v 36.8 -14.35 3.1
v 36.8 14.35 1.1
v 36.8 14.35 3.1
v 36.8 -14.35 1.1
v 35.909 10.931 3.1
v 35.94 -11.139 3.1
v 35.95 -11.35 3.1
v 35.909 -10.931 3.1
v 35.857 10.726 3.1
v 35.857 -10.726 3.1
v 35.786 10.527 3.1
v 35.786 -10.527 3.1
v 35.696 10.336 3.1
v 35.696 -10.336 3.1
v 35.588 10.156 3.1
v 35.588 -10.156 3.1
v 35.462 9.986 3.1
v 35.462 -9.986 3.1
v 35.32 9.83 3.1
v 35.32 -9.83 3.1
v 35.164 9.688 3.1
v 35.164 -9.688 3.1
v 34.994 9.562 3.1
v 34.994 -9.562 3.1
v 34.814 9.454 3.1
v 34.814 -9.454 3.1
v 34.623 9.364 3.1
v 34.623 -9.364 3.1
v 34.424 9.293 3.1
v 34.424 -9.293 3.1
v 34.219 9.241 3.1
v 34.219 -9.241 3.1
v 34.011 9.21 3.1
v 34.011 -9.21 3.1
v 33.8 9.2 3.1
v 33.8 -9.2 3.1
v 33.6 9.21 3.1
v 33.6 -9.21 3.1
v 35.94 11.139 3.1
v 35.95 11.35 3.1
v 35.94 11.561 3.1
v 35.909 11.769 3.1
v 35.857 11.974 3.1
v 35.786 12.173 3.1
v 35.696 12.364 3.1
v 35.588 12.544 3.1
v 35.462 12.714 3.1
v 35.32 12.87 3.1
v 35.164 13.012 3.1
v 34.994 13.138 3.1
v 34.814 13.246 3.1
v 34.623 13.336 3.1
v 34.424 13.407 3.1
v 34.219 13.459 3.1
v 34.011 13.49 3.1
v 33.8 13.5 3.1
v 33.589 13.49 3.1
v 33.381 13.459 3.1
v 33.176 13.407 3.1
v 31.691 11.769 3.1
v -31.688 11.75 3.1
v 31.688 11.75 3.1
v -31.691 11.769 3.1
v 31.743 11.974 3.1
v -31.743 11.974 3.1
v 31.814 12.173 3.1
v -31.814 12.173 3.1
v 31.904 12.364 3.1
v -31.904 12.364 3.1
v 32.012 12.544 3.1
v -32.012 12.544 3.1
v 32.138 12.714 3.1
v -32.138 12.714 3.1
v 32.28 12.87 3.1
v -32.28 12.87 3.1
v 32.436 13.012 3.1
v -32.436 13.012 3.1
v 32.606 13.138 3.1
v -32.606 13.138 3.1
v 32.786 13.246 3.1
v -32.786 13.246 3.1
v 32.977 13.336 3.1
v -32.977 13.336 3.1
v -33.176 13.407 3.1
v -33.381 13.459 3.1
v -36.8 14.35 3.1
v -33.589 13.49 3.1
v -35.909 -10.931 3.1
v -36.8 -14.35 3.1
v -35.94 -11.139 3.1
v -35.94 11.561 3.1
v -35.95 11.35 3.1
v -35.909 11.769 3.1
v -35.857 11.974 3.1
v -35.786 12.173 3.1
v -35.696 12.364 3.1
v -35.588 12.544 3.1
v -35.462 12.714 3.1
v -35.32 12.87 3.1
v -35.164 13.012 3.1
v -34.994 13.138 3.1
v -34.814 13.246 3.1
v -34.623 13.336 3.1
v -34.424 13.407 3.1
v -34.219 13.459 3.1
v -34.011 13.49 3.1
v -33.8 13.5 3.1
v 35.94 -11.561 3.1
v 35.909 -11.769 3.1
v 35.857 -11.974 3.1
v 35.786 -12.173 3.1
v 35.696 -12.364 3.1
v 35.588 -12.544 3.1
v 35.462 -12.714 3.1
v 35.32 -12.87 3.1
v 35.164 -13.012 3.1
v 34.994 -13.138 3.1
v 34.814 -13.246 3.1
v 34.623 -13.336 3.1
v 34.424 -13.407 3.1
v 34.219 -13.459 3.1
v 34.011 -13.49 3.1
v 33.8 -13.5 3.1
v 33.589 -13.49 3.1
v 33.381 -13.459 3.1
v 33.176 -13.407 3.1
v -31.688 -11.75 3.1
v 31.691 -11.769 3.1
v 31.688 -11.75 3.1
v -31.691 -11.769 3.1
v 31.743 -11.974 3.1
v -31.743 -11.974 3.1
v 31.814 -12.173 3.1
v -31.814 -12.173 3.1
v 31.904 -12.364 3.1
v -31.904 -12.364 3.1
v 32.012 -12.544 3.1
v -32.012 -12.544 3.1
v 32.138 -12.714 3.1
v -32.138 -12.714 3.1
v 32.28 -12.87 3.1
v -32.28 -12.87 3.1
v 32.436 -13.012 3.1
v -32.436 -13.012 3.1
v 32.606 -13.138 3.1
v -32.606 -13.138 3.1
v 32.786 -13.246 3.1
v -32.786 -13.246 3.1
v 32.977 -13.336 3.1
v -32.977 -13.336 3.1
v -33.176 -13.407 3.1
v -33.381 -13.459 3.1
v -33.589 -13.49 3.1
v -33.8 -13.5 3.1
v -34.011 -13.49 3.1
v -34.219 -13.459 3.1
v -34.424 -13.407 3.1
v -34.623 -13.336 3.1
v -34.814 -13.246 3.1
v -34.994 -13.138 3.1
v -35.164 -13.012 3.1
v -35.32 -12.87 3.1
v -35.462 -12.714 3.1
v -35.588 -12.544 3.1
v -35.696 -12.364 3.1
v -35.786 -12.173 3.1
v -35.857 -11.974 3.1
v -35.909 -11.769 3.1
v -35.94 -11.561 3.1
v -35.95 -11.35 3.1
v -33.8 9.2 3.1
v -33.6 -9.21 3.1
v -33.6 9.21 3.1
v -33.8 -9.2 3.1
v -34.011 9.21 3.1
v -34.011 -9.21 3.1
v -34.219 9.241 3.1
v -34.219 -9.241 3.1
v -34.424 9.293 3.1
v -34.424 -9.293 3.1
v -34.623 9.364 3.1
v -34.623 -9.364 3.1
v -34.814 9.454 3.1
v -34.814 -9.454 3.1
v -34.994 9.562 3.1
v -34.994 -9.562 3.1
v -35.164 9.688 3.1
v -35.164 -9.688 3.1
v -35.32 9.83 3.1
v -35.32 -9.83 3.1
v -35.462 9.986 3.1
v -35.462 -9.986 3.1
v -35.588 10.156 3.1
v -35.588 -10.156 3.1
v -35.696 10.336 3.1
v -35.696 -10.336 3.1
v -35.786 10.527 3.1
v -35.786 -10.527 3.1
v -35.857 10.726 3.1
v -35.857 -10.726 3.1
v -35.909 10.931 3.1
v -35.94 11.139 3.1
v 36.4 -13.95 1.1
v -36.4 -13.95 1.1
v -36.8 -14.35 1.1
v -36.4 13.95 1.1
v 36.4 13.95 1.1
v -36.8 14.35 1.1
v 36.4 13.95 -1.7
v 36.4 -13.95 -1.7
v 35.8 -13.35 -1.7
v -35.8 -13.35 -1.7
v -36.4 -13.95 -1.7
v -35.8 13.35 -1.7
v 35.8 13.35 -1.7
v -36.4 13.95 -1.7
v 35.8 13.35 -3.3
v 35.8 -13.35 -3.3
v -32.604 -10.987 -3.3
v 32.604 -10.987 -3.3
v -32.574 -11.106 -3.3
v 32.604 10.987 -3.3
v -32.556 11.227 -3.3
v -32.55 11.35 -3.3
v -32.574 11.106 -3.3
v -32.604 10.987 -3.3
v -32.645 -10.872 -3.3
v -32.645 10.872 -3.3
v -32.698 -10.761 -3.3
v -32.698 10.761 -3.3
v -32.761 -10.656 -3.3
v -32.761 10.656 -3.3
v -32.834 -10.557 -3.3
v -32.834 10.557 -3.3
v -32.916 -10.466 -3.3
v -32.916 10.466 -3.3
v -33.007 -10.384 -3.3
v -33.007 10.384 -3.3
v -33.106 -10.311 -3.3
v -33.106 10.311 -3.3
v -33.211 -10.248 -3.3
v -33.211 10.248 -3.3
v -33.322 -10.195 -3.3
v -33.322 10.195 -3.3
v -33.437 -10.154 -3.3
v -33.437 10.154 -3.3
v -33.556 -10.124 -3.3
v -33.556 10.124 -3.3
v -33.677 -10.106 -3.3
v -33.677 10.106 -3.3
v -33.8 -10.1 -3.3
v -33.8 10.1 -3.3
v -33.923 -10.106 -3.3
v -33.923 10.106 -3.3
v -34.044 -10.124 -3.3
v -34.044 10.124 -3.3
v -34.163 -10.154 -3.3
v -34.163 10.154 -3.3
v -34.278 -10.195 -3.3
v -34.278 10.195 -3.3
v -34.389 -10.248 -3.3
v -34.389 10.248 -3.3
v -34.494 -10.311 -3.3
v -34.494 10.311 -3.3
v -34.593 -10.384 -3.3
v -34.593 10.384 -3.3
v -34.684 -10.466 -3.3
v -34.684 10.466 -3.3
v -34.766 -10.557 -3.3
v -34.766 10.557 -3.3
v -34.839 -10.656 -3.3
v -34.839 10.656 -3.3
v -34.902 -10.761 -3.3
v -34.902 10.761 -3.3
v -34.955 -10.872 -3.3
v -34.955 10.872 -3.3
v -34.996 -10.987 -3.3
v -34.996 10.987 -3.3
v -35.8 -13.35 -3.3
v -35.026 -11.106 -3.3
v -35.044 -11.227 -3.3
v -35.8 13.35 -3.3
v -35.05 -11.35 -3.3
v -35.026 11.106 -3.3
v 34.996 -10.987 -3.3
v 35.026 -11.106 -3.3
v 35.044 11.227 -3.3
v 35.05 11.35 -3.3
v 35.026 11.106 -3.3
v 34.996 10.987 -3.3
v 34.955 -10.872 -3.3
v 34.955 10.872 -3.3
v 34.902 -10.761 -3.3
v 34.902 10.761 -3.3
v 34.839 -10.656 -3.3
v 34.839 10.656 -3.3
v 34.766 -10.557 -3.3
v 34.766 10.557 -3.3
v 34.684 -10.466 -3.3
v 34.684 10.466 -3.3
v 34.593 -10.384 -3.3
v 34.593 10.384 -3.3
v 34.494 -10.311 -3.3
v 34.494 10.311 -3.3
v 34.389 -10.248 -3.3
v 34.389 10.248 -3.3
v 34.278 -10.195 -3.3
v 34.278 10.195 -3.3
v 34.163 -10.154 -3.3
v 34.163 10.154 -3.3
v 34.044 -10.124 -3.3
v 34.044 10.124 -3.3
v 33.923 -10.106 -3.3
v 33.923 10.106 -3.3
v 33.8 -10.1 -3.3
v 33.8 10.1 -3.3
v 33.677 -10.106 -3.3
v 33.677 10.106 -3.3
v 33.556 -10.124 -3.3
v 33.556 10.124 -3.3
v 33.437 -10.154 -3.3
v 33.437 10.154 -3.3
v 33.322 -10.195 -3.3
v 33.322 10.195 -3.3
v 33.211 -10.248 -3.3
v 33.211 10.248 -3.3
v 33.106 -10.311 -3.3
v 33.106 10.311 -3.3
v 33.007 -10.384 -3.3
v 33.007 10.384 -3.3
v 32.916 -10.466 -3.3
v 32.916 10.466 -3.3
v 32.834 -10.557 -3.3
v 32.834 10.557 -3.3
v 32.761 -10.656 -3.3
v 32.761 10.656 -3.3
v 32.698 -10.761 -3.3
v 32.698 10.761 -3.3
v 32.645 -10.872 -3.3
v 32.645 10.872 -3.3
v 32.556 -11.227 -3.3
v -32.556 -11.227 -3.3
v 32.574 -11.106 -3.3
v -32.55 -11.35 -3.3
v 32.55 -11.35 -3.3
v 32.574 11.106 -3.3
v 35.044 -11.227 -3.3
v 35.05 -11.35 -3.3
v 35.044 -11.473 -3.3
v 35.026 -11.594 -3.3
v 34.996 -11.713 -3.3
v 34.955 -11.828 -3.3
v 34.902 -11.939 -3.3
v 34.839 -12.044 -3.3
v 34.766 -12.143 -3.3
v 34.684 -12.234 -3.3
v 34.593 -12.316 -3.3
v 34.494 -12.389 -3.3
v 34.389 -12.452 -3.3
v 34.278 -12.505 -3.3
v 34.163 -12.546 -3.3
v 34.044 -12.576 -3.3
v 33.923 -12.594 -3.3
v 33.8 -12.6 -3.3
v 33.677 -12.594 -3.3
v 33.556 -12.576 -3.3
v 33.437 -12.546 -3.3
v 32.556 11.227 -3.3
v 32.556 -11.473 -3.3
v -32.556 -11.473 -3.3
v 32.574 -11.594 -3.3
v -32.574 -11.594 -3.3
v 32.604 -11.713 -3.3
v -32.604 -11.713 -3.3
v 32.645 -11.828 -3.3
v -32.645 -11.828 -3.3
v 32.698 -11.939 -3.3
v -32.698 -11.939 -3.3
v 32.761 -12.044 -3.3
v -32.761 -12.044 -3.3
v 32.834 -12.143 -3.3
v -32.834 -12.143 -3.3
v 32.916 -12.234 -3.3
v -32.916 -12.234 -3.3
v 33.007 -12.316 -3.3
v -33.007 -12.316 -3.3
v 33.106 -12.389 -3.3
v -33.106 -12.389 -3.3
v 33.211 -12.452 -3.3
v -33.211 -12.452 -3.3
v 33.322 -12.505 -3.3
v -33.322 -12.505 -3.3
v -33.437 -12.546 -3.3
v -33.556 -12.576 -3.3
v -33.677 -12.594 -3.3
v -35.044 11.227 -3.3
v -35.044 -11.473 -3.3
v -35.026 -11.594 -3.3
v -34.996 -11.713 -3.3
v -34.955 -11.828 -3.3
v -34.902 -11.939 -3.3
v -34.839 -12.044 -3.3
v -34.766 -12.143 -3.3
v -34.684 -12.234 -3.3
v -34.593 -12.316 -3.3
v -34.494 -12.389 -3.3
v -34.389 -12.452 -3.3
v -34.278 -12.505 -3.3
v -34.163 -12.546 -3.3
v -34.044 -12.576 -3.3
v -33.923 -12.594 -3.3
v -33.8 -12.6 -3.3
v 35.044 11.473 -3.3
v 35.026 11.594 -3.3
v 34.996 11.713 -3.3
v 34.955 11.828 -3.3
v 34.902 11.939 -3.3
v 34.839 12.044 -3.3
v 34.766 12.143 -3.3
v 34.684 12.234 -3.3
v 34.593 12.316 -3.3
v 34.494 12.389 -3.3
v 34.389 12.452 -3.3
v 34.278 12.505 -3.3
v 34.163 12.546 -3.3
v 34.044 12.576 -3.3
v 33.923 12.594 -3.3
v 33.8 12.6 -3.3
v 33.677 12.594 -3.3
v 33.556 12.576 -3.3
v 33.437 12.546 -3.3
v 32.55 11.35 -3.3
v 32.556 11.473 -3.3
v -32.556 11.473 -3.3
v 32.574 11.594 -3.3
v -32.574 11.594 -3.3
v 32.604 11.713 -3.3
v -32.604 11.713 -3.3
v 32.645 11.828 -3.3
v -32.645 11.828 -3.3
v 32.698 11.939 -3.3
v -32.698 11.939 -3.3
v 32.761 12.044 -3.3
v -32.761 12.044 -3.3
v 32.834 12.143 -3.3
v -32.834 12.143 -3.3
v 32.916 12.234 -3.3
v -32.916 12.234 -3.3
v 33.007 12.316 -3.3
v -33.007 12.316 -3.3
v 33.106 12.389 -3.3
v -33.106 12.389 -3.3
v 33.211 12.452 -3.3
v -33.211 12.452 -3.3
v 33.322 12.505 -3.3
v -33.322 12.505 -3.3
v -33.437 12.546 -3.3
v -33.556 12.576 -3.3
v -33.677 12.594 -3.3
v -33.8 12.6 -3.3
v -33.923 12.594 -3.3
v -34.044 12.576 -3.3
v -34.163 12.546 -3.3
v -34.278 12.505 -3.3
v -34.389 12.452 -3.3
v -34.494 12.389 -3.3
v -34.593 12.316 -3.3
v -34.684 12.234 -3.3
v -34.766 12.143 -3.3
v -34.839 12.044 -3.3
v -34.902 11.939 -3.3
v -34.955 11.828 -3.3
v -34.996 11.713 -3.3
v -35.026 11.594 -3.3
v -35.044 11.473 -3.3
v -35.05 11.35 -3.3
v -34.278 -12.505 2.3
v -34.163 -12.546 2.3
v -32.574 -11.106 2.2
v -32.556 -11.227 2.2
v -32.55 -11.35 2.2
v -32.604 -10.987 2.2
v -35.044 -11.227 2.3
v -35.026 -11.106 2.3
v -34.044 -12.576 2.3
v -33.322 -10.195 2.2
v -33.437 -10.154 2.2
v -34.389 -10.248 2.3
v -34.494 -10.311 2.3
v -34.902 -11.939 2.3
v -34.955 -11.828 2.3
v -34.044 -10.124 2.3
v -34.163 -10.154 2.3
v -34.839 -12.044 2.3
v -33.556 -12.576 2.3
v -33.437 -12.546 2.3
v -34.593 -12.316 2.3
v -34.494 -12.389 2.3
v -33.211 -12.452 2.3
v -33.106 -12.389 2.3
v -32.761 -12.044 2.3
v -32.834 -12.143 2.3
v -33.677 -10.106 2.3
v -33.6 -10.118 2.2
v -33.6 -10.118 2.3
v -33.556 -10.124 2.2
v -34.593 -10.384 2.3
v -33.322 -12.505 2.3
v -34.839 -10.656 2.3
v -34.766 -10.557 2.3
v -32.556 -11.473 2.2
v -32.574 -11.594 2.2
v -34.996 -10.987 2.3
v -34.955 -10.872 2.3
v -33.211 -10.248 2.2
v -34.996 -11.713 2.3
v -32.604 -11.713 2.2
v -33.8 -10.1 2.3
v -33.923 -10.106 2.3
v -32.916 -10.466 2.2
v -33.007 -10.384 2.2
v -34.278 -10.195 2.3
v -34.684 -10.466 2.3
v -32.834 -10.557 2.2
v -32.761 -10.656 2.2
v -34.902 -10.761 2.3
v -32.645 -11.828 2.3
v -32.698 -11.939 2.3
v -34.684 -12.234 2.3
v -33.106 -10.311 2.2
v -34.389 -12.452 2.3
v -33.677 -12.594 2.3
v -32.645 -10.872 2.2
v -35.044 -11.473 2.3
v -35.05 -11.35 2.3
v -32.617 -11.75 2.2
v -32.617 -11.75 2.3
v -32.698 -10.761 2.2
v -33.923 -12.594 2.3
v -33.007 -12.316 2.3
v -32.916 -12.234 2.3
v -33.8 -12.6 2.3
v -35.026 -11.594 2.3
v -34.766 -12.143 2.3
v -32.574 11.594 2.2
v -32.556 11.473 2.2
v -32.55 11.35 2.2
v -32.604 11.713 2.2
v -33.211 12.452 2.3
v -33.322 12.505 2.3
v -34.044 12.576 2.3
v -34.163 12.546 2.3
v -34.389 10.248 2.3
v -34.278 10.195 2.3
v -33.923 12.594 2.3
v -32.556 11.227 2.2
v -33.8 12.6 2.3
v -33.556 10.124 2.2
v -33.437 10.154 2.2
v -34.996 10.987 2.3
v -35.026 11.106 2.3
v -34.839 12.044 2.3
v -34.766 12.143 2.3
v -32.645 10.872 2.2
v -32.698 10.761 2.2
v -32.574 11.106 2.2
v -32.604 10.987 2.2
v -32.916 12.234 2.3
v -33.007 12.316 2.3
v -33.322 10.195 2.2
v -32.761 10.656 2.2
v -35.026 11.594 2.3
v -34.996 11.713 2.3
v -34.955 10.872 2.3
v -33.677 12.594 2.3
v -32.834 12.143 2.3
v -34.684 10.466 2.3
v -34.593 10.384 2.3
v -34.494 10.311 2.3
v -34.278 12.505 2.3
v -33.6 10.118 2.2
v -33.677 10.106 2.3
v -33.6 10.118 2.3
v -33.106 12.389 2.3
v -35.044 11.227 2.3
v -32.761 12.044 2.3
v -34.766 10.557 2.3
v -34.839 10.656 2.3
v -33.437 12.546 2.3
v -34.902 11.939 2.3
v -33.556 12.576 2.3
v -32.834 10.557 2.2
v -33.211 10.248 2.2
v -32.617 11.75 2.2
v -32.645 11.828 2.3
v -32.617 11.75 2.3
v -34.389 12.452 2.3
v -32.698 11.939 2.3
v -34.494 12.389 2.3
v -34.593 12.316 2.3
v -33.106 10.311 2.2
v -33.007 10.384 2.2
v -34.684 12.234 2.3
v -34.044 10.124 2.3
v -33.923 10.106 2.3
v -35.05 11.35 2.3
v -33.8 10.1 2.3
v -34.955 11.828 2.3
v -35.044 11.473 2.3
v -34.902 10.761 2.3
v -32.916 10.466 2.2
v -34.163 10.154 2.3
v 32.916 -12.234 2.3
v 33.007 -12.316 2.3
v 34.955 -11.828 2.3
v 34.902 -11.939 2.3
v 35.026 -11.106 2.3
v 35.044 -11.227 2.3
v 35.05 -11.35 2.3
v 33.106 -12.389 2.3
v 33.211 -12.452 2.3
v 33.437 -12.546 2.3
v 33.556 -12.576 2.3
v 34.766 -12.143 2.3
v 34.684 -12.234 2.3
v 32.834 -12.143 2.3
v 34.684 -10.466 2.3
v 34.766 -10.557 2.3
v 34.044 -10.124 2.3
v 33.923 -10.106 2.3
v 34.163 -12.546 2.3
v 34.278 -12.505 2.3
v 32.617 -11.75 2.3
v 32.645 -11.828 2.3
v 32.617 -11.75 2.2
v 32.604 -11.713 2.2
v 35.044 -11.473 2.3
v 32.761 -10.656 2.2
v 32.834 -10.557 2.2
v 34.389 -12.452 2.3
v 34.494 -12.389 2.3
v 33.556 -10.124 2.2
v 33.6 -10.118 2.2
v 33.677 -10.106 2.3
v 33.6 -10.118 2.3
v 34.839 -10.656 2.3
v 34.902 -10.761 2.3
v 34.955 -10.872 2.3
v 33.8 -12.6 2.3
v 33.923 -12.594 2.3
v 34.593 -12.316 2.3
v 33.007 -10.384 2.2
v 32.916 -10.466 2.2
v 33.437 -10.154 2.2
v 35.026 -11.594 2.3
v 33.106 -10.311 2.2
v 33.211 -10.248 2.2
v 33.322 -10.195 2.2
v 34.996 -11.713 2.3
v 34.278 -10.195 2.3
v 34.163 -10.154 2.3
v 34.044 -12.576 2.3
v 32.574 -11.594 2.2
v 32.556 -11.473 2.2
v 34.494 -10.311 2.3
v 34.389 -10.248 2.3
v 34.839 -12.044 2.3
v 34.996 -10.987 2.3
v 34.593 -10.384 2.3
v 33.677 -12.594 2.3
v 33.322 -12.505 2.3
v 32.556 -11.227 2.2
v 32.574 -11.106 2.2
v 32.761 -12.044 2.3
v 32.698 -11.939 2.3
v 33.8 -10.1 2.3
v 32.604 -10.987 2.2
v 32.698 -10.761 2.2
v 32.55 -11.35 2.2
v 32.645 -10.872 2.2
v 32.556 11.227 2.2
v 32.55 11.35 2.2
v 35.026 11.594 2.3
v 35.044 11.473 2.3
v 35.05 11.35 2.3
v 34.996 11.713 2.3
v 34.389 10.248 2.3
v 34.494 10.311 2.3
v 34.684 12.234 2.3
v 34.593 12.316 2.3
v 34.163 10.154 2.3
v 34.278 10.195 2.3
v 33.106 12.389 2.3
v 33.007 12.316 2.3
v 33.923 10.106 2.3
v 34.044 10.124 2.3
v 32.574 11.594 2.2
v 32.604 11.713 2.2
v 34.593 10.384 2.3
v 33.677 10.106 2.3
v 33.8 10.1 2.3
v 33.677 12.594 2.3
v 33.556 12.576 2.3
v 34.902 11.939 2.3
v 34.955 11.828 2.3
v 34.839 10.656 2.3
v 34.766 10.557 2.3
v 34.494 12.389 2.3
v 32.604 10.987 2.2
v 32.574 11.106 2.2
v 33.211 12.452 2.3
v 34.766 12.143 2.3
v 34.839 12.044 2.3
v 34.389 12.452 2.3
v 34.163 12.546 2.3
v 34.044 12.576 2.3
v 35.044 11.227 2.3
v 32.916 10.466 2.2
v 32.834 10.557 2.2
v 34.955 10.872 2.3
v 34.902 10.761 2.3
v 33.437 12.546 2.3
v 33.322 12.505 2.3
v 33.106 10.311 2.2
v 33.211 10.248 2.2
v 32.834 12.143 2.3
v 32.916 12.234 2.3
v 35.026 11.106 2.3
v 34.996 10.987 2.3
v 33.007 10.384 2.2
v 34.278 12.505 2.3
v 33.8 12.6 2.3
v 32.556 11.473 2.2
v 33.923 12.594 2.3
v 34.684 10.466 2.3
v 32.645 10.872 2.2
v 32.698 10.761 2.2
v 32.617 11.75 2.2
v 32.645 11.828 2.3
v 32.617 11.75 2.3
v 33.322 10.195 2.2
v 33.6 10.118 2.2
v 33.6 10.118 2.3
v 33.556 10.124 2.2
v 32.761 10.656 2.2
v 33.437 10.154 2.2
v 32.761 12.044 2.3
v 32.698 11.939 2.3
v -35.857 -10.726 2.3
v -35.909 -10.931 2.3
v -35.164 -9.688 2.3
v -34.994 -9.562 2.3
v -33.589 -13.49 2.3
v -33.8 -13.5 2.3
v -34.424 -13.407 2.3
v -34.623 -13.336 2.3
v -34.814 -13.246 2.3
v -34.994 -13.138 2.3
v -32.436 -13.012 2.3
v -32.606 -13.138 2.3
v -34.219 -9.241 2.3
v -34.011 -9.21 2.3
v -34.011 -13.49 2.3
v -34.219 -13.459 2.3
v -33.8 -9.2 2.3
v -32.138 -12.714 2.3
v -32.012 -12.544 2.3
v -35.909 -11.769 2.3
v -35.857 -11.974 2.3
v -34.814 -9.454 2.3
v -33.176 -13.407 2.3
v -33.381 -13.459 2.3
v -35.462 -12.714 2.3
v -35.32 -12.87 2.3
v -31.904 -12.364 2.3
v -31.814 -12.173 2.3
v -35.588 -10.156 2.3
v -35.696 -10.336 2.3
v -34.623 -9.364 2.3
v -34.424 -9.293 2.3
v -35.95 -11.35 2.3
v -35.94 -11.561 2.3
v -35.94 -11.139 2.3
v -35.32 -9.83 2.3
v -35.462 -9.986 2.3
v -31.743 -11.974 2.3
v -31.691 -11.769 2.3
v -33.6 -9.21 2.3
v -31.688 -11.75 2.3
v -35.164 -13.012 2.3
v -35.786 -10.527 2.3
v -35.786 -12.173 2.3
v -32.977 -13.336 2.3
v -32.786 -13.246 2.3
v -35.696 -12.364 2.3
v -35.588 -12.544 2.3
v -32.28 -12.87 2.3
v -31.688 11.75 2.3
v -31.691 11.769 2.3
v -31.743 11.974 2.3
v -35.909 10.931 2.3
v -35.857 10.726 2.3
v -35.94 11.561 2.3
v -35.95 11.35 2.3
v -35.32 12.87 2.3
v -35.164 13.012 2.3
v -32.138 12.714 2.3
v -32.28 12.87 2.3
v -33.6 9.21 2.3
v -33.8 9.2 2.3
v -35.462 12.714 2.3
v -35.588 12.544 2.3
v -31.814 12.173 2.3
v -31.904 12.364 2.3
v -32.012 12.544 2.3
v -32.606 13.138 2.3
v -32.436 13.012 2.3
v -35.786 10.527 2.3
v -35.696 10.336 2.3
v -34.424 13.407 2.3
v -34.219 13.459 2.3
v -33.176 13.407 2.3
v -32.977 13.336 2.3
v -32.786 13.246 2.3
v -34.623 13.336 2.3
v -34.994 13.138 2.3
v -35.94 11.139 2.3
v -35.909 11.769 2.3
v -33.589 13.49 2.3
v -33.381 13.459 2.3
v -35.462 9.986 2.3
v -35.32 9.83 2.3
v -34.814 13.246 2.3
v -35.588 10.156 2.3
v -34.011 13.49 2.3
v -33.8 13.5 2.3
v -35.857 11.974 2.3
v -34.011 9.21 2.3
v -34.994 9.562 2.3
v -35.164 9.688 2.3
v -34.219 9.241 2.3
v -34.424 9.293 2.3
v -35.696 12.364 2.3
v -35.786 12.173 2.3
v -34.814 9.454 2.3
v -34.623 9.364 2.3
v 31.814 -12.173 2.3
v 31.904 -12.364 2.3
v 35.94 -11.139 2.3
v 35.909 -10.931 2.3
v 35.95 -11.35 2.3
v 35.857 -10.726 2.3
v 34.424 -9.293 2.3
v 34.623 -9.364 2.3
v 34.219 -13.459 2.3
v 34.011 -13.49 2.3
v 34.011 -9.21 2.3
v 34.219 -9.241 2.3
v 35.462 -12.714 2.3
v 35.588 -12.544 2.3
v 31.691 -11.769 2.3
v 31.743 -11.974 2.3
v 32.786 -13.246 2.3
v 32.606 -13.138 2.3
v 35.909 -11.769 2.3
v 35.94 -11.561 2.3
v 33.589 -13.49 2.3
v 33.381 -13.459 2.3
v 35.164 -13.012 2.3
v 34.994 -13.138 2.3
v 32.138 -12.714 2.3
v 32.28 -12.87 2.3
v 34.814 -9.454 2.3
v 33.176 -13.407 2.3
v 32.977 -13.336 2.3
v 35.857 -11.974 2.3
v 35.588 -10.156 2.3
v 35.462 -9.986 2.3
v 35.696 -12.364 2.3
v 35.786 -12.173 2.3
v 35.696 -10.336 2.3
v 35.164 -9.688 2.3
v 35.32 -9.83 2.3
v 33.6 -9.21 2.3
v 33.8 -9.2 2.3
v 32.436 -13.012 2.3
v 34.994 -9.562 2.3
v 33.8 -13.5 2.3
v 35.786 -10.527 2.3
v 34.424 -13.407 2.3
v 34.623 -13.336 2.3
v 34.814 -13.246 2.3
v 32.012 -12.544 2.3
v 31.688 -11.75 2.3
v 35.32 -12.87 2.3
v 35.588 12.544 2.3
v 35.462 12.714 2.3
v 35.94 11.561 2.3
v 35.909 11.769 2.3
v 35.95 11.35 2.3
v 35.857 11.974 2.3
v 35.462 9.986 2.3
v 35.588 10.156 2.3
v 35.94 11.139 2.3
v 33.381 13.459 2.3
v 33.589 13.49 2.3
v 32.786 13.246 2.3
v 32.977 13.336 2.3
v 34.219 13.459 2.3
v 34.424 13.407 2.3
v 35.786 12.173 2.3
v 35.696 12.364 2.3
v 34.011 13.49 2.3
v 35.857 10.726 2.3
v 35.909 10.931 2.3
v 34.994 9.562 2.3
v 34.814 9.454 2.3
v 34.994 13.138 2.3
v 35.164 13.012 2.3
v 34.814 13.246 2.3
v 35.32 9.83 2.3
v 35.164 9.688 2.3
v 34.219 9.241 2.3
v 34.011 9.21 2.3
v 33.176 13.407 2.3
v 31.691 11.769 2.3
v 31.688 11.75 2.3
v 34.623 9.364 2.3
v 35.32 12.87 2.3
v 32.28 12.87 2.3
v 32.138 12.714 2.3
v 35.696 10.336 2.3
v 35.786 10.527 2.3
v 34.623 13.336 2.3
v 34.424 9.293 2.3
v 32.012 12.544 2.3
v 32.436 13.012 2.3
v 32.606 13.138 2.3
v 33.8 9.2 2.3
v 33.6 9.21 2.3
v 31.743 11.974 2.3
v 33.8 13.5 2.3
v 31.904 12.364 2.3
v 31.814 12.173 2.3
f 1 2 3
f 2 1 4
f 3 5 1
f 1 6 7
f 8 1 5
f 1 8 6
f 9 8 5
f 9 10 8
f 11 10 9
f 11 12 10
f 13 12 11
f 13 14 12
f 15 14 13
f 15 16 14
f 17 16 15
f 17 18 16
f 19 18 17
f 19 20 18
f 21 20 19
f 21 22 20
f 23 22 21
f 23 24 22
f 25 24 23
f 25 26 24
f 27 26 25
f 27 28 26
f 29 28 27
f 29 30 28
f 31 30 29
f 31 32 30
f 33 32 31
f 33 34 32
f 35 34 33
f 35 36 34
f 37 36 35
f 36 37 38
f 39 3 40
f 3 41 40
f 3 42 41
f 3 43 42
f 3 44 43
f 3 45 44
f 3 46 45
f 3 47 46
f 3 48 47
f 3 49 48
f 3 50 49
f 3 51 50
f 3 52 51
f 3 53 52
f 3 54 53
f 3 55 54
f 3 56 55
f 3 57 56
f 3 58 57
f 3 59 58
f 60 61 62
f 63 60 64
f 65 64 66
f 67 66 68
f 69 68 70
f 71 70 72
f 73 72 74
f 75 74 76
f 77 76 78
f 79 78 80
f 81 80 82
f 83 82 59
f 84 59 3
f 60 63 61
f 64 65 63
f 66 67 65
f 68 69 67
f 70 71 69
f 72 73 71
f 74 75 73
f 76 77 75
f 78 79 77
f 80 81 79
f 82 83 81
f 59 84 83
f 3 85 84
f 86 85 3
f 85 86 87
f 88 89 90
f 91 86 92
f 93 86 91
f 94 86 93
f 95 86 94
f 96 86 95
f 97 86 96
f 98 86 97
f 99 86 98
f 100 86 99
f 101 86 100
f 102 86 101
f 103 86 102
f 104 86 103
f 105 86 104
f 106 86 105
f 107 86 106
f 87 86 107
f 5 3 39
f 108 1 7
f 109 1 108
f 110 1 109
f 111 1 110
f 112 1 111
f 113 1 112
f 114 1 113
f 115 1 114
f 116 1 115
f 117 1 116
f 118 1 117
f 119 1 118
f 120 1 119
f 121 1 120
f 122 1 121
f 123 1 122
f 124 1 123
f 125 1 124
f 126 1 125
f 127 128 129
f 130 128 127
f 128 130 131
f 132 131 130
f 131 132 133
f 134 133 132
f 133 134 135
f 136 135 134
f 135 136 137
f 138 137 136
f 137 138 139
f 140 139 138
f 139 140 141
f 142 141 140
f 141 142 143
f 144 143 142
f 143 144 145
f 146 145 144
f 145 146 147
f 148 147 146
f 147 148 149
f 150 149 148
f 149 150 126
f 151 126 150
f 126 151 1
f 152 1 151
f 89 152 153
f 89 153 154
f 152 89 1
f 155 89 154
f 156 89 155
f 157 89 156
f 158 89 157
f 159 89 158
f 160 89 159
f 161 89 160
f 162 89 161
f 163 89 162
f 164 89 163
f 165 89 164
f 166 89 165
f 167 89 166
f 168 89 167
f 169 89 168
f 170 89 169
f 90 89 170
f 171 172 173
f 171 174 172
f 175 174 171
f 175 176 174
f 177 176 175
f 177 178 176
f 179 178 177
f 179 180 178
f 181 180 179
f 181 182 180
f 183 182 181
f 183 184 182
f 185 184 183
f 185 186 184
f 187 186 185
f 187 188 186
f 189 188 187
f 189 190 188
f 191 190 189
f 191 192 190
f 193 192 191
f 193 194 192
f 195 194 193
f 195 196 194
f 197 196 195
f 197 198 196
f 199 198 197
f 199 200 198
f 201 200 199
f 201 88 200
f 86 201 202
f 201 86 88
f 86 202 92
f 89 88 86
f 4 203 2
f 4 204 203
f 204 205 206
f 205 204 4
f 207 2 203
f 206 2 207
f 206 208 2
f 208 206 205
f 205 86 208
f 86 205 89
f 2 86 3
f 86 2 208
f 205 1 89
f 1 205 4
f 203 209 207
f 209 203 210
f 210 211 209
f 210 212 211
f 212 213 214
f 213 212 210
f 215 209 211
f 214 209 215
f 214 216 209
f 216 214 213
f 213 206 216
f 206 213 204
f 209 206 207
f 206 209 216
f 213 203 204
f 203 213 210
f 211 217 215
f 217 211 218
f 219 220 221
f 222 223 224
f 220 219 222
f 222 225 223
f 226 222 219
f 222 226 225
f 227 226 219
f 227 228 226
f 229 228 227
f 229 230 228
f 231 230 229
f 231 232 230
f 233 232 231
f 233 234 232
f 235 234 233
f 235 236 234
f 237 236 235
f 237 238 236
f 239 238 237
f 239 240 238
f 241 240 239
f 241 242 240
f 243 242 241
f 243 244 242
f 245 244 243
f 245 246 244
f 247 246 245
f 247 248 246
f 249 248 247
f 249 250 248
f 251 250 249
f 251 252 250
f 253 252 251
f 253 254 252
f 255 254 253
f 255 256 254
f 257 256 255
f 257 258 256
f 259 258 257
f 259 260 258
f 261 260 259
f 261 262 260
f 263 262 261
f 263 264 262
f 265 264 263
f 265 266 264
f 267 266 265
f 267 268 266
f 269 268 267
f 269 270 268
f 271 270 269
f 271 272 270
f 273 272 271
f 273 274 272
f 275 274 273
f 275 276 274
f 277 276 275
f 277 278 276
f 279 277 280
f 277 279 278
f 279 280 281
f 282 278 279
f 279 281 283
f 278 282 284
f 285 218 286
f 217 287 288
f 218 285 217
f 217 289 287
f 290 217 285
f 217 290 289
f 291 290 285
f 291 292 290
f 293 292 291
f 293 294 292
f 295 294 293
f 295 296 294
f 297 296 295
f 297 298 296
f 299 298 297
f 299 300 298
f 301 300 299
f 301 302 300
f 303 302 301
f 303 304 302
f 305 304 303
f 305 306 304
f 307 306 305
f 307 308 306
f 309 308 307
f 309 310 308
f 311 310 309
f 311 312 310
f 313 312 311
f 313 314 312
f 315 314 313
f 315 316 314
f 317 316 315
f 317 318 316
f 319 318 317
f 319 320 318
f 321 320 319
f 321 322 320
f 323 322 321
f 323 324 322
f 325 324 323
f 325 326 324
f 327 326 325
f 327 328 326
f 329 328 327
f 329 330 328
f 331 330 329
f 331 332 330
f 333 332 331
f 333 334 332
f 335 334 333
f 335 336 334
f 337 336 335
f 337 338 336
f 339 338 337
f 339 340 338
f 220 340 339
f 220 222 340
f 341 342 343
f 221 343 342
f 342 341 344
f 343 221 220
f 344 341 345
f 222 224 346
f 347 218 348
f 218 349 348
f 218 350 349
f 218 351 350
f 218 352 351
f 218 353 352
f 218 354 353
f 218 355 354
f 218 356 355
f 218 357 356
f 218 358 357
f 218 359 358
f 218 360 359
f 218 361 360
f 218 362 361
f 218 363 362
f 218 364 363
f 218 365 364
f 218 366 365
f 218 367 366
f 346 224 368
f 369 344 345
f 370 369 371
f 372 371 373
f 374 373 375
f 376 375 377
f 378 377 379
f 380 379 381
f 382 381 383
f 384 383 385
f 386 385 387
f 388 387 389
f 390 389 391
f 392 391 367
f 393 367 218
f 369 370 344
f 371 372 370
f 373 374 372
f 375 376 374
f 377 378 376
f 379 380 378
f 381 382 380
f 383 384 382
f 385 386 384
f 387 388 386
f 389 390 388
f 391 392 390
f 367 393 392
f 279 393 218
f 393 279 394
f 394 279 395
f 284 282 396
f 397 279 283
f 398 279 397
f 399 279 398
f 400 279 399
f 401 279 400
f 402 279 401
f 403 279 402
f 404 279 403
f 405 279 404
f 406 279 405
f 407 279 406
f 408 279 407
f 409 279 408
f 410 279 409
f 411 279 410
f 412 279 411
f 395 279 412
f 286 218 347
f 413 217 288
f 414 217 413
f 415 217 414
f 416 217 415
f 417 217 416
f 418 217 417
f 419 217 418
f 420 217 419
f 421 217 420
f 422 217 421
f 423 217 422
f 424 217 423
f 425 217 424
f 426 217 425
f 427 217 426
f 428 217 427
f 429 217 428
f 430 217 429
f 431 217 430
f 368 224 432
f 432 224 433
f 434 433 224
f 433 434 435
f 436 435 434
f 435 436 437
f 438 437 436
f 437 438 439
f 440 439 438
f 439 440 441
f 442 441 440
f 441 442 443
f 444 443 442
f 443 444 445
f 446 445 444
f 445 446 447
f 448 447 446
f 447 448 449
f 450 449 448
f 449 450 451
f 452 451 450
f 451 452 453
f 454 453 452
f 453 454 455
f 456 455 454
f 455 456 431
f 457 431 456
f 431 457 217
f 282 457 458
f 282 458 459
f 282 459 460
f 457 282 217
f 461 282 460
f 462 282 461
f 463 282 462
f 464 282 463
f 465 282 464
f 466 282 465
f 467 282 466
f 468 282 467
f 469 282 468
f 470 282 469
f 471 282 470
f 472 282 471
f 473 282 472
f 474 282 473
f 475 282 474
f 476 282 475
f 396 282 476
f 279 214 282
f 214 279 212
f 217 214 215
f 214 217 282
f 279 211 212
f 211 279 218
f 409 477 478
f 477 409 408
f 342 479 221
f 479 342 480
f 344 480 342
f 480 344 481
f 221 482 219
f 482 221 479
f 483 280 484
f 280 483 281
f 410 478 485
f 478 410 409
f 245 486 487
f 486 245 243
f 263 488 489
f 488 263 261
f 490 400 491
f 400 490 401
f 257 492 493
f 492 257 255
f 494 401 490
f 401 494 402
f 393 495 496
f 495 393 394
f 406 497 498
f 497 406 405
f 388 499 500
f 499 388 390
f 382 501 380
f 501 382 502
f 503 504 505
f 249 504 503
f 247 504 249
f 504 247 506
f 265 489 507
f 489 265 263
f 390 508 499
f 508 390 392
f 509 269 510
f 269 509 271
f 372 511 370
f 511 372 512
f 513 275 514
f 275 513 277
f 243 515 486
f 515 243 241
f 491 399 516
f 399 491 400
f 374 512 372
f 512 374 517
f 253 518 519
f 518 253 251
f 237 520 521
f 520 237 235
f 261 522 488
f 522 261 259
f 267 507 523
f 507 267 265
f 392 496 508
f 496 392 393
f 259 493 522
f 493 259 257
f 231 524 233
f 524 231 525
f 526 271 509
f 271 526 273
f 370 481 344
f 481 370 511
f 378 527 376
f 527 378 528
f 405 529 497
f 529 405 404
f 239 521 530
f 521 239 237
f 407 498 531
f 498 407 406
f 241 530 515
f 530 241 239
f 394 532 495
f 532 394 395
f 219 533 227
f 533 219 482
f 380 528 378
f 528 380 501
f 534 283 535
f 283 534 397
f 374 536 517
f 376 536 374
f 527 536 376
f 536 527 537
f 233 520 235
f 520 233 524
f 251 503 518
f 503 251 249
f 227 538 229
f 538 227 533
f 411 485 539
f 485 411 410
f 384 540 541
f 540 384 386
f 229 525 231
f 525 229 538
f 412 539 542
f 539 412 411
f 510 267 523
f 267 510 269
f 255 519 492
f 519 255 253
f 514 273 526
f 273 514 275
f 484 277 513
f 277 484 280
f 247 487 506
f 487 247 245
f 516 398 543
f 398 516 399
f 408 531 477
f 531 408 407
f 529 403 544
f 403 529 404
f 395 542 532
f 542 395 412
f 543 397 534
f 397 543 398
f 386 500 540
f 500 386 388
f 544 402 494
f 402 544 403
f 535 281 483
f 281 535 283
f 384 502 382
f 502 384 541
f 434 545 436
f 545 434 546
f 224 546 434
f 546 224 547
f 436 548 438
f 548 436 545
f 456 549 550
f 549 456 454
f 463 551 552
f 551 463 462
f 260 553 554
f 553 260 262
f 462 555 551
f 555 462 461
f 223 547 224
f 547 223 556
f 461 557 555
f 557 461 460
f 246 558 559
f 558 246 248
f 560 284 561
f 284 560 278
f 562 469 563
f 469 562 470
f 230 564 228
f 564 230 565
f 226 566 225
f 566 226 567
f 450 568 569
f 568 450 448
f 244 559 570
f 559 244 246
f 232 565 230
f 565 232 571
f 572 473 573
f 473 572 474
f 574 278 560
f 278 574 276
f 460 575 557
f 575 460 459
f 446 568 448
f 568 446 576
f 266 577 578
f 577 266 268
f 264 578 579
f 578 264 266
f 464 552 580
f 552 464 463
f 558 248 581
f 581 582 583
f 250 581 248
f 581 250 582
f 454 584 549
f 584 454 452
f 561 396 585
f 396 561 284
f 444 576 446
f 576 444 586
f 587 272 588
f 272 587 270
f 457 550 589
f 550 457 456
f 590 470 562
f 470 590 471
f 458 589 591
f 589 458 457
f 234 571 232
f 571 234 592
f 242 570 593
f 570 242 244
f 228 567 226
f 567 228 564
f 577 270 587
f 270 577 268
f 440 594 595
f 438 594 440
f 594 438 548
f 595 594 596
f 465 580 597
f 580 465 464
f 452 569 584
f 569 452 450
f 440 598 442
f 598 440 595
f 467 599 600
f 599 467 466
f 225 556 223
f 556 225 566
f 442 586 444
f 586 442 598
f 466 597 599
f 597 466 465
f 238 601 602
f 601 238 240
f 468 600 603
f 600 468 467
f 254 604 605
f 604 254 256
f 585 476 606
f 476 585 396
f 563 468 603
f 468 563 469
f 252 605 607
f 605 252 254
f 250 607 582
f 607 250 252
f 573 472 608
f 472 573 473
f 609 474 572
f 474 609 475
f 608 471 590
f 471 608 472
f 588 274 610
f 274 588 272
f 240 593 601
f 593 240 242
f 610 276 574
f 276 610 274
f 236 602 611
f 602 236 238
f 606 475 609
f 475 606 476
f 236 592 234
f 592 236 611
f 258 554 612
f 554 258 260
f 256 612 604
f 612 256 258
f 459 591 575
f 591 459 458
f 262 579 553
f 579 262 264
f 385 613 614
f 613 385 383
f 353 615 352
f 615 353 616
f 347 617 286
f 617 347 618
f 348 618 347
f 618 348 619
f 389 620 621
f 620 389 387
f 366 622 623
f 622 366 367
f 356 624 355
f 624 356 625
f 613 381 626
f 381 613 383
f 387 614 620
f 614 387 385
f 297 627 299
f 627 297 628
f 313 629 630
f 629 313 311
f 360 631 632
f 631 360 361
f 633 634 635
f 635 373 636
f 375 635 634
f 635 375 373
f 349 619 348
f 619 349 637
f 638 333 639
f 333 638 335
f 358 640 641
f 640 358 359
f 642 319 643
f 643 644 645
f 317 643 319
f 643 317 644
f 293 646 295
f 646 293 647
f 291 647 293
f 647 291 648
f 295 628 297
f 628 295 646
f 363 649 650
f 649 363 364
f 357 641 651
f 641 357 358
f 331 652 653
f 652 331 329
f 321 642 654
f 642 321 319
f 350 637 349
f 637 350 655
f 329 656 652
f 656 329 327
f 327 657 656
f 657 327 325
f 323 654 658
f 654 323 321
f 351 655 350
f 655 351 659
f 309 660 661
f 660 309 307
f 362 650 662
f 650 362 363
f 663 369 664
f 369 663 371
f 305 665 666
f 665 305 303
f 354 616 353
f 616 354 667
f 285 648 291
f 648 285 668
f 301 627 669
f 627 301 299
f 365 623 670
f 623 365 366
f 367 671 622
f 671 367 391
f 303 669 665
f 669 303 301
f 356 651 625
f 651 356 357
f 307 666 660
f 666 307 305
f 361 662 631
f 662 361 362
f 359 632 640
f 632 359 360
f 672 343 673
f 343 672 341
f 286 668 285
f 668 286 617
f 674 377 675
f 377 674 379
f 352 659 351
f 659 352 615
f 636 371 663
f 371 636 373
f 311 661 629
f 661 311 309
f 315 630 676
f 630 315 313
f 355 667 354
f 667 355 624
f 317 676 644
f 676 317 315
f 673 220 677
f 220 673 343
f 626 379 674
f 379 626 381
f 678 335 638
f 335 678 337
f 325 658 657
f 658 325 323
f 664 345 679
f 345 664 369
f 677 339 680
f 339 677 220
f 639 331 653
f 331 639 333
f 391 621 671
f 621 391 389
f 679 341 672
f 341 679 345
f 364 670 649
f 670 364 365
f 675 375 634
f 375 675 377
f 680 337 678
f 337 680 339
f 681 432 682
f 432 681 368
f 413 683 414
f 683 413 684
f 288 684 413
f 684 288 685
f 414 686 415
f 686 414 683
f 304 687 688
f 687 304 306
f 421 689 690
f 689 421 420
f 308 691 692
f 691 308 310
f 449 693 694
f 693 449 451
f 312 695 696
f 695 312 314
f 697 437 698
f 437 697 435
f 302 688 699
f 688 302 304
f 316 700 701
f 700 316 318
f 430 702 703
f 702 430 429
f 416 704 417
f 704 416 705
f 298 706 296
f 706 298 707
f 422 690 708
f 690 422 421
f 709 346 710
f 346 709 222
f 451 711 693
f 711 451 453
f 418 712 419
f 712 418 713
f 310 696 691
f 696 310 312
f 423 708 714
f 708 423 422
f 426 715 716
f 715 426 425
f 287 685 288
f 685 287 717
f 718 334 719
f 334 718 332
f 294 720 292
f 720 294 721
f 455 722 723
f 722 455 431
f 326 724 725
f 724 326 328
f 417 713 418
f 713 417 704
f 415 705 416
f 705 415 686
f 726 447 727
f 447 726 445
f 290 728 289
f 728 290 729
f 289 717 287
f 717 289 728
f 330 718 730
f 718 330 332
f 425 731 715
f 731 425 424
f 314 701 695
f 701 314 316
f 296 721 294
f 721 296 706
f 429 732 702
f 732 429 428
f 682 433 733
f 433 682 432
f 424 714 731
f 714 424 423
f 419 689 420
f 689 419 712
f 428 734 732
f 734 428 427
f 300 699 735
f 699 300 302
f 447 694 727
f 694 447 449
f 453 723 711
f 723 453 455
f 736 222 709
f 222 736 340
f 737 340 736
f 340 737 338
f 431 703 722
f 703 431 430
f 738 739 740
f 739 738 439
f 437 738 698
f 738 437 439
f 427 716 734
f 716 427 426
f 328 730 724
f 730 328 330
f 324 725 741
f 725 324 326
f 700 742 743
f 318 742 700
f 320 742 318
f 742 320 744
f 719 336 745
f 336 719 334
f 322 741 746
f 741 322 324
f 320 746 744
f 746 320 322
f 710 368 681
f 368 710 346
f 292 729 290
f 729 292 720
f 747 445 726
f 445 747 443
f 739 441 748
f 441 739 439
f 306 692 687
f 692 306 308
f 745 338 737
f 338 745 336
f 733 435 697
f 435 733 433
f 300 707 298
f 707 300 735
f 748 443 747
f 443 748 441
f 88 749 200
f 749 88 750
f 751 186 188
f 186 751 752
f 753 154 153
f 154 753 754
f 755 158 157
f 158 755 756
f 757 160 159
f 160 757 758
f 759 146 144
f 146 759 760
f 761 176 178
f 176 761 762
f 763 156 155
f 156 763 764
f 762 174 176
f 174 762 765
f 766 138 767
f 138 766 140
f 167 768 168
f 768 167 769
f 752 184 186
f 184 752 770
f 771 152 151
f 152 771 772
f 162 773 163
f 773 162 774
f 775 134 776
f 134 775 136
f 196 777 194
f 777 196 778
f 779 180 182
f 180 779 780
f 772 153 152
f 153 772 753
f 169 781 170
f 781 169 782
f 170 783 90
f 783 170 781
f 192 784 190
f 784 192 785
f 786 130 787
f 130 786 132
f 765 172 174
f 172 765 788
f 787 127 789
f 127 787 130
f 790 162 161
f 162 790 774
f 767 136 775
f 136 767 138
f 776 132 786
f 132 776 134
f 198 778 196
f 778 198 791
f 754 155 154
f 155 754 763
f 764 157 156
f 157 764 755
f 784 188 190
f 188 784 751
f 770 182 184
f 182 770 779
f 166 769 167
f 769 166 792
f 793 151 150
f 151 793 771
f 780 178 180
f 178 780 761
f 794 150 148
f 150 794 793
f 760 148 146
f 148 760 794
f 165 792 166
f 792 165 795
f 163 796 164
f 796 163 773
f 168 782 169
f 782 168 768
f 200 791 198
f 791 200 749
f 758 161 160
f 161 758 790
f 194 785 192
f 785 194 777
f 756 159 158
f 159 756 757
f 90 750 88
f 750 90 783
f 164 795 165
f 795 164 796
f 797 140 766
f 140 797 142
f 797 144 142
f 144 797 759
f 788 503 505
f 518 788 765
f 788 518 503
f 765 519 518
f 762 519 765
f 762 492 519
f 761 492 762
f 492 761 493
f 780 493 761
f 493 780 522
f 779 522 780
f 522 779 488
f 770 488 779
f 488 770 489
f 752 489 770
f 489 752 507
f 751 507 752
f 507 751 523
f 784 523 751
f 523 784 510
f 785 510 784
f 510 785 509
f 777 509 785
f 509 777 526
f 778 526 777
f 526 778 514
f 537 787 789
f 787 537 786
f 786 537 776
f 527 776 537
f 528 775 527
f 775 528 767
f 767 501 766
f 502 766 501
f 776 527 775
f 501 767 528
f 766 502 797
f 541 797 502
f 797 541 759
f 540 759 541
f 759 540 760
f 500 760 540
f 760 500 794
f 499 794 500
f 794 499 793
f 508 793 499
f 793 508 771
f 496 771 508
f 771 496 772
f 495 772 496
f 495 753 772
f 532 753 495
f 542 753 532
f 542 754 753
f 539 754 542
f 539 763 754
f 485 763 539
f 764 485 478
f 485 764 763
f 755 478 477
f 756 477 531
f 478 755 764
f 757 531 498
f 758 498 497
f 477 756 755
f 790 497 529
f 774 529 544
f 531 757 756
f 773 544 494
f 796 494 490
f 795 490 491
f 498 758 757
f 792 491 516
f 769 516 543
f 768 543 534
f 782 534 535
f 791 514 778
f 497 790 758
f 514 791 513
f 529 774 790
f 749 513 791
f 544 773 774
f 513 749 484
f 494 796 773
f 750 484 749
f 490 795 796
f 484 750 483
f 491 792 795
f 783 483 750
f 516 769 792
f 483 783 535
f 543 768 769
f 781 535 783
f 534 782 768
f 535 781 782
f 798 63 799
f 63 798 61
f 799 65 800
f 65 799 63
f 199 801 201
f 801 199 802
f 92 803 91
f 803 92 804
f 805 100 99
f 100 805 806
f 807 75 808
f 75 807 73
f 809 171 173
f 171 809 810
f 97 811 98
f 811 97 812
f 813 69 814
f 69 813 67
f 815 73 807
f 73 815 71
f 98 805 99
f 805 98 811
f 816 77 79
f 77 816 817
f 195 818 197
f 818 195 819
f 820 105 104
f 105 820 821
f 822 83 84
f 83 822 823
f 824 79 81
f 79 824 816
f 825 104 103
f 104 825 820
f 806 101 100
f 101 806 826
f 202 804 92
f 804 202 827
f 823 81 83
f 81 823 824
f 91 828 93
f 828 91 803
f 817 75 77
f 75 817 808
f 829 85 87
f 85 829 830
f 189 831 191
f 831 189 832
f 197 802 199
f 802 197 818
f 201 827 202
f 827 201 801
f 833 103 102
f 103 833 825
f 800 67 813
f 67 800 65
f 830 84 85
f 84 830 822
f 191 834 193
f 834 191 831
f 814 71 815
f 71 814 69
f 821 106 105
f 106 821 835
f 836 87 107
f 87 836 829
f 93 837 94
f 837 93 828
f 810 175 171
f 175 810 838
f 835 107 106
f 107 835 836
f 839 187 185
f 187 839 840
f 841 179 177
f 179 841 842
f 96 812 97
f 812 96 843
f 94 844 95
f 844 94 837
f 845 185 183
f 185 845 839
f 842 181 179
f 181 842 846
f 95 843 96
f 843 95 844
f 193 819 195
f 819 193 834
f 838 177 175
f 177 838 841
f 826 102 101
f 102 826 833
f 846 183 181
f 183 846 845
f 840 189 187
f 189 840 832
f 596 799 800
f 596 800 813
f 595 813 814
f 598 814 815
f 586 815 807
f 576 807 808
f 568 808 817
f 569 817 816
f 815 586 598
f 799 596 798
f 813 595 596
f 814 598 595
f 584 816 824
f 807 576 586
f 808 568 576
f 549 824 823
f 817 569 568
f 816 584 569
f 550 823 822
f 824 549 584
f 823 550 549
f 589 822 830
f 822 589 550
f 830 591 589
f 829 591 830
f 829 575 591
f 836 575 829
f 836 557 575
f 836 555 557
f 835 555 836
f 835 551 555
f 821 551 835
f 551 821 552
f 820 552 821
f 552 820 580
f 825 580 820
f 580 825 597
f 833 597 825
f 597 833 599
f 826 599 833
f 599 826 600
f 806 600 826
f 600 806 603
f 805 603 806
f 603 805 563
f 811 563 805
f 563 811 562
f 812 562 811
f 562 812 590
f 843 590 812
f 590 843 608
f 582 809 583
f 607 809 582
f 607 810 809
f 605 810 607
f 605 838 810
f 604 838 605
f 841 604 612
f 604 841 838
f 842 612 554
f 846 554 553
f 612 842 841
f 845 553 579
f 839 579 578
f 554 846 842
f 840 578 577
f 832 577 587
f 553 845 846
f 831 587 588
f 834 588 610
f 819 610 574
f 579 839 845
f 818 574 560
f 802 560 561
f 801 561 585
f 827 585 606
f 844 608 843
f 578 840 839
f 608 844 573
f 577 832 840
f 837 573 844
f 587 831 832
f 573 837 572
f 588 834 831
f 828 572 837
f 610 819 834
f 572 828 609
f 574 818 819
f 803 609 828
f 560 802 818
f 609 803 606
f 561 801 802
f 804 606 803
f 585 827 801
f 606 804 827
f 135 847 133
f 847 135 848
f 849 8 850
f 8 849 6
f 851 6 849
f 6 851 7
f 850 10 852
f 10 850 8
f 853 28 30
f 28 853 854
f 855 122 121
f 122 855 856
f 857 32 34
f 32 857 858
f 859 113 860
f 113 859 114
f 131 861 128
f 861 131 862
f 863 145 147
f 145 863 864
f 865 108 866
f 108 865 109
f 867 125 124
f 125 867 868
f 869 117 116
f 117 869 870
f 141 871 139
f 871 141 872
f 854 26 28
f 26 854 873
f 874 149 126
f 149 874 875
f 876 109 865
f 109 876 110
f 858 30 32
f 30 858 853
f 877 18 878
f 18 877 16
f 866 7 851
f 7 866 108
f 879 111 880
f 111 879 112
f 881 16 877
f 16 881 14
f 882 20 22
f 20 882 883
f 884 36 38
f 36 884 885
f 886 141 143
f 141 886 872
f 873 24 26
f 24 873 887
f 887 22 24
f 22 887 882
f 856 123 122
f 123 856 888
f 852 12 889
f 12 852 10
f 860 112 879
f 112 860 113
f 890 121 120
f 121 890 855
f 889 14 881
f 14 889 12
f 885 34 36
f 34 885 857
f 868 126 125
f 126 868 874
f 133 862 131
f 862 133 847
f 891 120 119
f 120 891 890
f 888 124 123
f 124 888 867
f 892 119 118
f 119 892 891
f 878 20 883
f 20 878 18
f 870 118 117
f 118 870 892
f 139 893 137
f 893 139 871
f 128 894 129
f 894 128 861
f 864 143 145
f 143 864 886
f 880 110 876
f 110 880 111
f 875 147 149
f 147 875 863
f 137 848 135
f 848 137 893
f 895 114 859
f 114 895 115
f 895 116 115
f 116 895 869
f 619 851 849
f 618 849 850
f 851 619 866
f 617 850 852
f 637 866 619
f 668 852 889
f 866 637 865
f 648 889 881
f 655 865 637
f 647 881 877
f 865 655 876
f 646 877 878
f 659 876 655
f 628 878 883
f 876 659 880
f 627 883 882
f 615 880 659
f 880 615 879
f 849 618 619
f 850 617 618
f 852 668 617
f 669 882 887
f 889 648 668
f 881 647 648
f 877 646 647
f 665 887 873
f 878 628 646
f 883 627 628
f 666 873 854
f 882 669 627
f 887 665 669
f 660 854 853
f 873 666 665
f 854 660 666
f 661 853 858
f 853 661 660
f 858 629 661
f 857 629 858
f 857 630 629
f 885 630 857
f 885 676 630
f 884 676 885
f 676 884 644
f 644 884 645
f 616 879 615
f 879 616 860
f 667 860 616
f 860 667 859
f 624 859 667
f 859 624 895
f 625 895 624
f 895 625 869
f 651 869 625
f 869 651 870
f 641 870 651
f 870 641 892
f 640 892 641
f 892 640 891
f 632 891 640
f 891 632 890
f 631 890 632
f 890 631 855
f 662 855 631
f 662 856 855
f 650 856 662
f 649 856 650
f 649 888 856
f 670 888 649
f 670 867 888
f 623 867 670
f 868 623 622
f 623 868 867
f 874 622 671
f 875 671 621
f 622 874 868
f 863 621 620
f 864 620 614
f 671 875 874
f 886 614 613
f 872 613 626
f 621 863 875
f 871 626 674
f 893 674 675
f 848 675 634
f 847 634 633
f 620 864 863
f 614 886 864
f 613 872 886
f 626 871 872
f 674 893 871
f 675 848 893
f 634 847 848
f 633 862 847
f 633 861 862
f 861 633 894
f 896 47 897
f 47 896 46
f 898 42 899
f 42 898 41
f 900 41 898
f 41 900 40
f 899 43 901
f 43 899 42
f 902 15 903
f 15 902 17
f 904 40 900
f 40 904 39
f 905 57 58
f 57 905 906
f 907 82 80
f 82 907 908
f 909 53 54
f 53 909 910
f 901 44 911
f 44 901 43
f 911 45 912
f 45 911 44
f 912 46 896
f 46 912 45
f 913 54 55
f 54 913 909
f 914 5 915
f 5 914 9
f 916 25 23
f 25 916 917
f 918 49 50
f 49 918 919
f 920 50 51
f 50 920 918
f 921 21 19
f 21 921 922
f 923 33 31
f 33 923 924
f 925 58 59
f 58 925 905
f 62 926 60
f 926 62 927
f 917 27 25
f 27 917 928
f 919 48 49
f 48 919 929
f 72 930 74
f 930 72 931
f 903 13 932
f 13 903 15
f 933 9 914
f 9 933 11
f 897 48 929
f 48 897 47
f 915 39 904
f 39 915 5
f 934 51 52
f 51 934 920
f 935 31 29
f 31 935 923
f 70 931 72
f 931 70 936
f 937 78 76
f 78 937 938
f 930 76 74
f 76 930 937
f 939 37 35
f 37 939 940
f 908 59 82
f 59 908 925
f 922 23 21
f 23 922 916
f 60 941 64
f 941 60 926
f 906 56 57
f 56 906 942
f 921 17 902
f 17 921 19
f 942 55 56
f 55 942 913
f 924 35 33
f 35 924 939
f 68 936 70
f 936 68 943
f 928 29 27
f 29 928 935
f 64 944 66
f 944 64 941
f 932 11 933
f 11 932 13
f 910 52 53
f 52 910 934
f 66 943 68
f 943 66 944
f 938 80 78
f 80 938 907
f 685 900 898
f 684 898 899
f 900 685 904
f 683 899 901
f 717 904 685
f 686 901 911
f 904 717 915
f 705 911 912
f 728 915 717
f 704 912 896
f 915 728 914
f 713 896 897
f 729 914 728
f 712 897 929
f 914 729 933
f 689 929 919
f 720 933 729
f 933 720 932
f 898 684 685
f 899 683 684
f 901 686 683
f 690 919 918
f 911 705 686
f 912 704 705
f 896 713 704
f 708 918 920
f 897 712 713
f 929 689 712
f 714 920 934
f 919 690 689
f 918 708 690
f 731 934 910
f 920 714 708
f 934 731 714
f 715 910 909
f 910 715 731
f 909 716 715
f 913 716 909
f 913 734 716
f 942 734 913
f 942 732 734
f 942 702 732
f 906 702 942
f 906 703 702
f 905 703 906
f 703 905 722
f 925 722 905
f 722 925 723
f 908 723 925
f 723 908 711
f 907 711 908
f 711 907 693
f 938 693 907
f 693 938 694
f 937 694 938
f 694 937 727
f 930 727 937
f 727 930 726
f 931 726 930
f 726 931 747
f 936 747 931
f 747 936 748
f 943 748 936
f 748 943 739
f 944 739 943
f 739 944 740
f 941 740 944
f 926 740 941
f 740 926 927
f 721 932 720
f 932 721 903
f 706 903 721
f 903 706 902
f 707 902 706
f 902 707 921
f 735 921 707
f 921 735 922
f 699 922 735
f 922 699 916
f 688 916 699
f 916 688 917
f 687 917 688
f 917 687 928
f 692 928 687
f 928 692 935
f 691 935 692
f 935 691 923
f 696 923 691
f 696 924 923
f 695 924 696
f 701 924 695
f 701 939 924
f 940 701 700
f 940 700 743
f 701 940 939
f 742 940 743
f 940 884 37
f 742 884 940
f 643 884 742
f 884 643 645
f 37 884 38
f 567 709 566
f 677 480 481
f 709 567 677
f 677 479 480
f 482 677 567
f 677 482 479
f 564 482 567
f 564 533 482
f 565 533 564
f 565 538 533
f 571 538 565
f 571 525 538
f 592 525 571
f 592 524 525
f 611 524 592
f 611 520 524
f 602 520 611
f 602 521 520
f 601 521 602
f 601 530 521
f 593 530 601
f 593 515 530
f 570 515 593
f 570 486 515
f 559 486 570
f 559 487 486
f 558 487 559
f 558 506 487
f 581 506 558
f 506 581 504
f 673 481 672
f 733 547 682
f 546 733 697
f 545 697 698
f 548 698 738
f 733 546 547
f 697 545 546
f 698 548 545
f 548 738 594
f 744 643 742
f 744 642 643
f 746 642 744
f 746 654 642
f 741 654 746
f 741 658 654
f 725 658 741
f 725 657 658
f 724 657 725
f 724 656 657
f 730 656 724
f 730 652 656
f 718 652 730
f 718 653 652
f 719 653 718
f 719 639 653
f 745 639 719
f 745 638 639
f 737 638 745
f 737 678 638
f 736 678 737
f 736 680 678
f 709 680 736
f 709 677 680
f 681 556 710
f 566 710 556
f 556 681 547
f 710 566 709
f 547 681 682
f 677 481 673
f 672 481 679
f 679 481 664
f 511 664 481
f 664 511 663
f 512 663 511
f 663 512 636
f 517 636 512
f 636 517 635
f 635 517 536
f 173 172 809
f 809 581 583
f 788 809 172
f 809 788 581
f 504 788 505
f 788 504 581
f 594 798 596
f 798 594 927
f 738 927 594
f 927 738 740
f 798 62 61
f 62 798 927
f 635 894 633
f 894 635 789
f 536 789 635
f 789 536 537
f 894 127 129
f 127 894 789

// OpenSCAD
$fn = 64;

// One-piece connected solid approximation of an LCD module (S-7282B style)
// Overall footprint: 73.6mm x 28.7mm

module lcd_module_s7282b(
    W = 73.6,          // overall width (X)
    H = 28.7,          // overall height (Y)
    T = 6.2,           // overall thickness (Z)
    overlap = 0.4      // intentional overlap to guarantee connectivity
) {
    // Front bezel/frame
    bezel_t = 2.0;
    bezel_margin_x = 3.2;
    bezel_margin_y = 2.6;

    // Screen window recess (cut into bezel)
    window_w = W - 2*bezel_margin_x;
    window_h = H - 2*bezel_margin_y;
    window_depth = 0.9;

    // Rear PCB slab
    pcb_t = 1.6;
    pcb_margin_x = 1.0;
    pcb_margin_y = 1.0;
    pcb_w = W - 2*pcb_margin_x;
    pcb_h = H - 2*pcb_margin_y;

    // Back components (as bumps on PCB)
    blob_h = 1.6;
    blob1 = [18, 10, blob_h];
    blob2 = [14, 8,  blob_h];
    blob3 = [10, 6,  blob_h];

    // Pin header block (integrated)
    header_pins = 16;
    pin_pitch = 2.54;
    header_w = header_pins * pin_pitch; // along X
    header_d = 4.0;                     // along Y
    header_h = 3.0;                     // along Z

    // Place header near bottom edge on back side
    header_y_from_bottom = 3.2;
    header_yc = -H/2 + header_y_from_bottom + header_d/2;

    // Mounting holes (represented as shallow front counterbores + through holes)
    hole_r = 1.25;
    hole_inset_x = 3.0;
    hole_inset_y = 3.0;
    hole_x = W/2 - hole_inset_x;
    hole_y = H/2 - hole_inset_y;

    // Z layout (centered overall)
    // Total thickness T = bezel_t + (core_t) + pcb_t
    core_t = max(0.1, T - bezel_t - pcb_t);

    z_front = +T/2;
    z_bezel_c = z_front - bezel_t/2;
    z_core_c  = z_front - bezel_t - core_t/2;
    z_pcb_c   = -T/2 + pcb_t/2;

    difference() {
        union() {
            // Bezel/frame (front)
            translate([0, 0, z_bezel_c])
                cube([W, H, bezel_t], center=true);

            // Core body (middle)
            translate([0, 0, z_core_c])
                cube([W - 0.8, H - 0.8, core_t + overlap], center=true);

            // PCB (back)
            translate([0, 0, z_pcb_c])
                cube([pcb_w, pcb_h, pcb_t + overlap], center=true);

            // Back components (bumps) on PCB
            translate([-W*0.18,  H*0.12, z_pcb_c + pcb_t/2 + blob1[2]/2 - overlap/2])
                cube(blob1, center=true);
            translate([ W*0.22,  H*0.10, z_pcb_c + pcb_t/2 + blob2[2]/2 - overlap/2])
                cube(blob2, center=true);
            translate([ W*0.05, -H*0.18, z_pcb_c + pcb_t/2 + blob3[2]/2 - overlap/2])
                cube(blob3, center=true);

            // Pin header block (back, near bottom edge)
            translate([0, header_yc, z_pcb_c + pcb_t/2 + header_h/2 - overlap/2])
                cube([header_w, header_d, header_h], center=true);

            // Small strain-relief/connector base behind header (keeps it looking like a module)
            translate([0, header_yc + header_d/2 + 1.2, z_pcb_c + pcb_t/2 + (header_h-0.6)/2 - overlap/2])
                cube([header_w*0.75, 2.4, header_h-0.6], center=true);
        }

        // Screen window recess in bezel (front cut)
        translate([0, 0, z_front - window_depth/2 + overlap/2])
            cube([window_w, window_h, window_depth + overlap], center=true);

        // Mounting through-holes (4 corners)
        for (sx = [-1, 1], sy = [-1, 1]) {
            translate([sx*hole_x, sy*hole_y, 0])
                cylinder(h = T + 2*overlap, r = hole_r, center=true);
        }

        // Shallow front counterbore rings (visual detail)
        cb_r = hole_r + 0.9;
        cb_d = 0.8;
        for (sx = [-1, 1], sy = [-1, 1]) {
            translate([sx*hole_x, sy*hole_y, z_front - cb_d/2 + overlap/2])
                cylinder(h = cb_d + overlap, r = cb_r, center=true);
        }
    }
}

// Render
lcd_module_s7282b();
